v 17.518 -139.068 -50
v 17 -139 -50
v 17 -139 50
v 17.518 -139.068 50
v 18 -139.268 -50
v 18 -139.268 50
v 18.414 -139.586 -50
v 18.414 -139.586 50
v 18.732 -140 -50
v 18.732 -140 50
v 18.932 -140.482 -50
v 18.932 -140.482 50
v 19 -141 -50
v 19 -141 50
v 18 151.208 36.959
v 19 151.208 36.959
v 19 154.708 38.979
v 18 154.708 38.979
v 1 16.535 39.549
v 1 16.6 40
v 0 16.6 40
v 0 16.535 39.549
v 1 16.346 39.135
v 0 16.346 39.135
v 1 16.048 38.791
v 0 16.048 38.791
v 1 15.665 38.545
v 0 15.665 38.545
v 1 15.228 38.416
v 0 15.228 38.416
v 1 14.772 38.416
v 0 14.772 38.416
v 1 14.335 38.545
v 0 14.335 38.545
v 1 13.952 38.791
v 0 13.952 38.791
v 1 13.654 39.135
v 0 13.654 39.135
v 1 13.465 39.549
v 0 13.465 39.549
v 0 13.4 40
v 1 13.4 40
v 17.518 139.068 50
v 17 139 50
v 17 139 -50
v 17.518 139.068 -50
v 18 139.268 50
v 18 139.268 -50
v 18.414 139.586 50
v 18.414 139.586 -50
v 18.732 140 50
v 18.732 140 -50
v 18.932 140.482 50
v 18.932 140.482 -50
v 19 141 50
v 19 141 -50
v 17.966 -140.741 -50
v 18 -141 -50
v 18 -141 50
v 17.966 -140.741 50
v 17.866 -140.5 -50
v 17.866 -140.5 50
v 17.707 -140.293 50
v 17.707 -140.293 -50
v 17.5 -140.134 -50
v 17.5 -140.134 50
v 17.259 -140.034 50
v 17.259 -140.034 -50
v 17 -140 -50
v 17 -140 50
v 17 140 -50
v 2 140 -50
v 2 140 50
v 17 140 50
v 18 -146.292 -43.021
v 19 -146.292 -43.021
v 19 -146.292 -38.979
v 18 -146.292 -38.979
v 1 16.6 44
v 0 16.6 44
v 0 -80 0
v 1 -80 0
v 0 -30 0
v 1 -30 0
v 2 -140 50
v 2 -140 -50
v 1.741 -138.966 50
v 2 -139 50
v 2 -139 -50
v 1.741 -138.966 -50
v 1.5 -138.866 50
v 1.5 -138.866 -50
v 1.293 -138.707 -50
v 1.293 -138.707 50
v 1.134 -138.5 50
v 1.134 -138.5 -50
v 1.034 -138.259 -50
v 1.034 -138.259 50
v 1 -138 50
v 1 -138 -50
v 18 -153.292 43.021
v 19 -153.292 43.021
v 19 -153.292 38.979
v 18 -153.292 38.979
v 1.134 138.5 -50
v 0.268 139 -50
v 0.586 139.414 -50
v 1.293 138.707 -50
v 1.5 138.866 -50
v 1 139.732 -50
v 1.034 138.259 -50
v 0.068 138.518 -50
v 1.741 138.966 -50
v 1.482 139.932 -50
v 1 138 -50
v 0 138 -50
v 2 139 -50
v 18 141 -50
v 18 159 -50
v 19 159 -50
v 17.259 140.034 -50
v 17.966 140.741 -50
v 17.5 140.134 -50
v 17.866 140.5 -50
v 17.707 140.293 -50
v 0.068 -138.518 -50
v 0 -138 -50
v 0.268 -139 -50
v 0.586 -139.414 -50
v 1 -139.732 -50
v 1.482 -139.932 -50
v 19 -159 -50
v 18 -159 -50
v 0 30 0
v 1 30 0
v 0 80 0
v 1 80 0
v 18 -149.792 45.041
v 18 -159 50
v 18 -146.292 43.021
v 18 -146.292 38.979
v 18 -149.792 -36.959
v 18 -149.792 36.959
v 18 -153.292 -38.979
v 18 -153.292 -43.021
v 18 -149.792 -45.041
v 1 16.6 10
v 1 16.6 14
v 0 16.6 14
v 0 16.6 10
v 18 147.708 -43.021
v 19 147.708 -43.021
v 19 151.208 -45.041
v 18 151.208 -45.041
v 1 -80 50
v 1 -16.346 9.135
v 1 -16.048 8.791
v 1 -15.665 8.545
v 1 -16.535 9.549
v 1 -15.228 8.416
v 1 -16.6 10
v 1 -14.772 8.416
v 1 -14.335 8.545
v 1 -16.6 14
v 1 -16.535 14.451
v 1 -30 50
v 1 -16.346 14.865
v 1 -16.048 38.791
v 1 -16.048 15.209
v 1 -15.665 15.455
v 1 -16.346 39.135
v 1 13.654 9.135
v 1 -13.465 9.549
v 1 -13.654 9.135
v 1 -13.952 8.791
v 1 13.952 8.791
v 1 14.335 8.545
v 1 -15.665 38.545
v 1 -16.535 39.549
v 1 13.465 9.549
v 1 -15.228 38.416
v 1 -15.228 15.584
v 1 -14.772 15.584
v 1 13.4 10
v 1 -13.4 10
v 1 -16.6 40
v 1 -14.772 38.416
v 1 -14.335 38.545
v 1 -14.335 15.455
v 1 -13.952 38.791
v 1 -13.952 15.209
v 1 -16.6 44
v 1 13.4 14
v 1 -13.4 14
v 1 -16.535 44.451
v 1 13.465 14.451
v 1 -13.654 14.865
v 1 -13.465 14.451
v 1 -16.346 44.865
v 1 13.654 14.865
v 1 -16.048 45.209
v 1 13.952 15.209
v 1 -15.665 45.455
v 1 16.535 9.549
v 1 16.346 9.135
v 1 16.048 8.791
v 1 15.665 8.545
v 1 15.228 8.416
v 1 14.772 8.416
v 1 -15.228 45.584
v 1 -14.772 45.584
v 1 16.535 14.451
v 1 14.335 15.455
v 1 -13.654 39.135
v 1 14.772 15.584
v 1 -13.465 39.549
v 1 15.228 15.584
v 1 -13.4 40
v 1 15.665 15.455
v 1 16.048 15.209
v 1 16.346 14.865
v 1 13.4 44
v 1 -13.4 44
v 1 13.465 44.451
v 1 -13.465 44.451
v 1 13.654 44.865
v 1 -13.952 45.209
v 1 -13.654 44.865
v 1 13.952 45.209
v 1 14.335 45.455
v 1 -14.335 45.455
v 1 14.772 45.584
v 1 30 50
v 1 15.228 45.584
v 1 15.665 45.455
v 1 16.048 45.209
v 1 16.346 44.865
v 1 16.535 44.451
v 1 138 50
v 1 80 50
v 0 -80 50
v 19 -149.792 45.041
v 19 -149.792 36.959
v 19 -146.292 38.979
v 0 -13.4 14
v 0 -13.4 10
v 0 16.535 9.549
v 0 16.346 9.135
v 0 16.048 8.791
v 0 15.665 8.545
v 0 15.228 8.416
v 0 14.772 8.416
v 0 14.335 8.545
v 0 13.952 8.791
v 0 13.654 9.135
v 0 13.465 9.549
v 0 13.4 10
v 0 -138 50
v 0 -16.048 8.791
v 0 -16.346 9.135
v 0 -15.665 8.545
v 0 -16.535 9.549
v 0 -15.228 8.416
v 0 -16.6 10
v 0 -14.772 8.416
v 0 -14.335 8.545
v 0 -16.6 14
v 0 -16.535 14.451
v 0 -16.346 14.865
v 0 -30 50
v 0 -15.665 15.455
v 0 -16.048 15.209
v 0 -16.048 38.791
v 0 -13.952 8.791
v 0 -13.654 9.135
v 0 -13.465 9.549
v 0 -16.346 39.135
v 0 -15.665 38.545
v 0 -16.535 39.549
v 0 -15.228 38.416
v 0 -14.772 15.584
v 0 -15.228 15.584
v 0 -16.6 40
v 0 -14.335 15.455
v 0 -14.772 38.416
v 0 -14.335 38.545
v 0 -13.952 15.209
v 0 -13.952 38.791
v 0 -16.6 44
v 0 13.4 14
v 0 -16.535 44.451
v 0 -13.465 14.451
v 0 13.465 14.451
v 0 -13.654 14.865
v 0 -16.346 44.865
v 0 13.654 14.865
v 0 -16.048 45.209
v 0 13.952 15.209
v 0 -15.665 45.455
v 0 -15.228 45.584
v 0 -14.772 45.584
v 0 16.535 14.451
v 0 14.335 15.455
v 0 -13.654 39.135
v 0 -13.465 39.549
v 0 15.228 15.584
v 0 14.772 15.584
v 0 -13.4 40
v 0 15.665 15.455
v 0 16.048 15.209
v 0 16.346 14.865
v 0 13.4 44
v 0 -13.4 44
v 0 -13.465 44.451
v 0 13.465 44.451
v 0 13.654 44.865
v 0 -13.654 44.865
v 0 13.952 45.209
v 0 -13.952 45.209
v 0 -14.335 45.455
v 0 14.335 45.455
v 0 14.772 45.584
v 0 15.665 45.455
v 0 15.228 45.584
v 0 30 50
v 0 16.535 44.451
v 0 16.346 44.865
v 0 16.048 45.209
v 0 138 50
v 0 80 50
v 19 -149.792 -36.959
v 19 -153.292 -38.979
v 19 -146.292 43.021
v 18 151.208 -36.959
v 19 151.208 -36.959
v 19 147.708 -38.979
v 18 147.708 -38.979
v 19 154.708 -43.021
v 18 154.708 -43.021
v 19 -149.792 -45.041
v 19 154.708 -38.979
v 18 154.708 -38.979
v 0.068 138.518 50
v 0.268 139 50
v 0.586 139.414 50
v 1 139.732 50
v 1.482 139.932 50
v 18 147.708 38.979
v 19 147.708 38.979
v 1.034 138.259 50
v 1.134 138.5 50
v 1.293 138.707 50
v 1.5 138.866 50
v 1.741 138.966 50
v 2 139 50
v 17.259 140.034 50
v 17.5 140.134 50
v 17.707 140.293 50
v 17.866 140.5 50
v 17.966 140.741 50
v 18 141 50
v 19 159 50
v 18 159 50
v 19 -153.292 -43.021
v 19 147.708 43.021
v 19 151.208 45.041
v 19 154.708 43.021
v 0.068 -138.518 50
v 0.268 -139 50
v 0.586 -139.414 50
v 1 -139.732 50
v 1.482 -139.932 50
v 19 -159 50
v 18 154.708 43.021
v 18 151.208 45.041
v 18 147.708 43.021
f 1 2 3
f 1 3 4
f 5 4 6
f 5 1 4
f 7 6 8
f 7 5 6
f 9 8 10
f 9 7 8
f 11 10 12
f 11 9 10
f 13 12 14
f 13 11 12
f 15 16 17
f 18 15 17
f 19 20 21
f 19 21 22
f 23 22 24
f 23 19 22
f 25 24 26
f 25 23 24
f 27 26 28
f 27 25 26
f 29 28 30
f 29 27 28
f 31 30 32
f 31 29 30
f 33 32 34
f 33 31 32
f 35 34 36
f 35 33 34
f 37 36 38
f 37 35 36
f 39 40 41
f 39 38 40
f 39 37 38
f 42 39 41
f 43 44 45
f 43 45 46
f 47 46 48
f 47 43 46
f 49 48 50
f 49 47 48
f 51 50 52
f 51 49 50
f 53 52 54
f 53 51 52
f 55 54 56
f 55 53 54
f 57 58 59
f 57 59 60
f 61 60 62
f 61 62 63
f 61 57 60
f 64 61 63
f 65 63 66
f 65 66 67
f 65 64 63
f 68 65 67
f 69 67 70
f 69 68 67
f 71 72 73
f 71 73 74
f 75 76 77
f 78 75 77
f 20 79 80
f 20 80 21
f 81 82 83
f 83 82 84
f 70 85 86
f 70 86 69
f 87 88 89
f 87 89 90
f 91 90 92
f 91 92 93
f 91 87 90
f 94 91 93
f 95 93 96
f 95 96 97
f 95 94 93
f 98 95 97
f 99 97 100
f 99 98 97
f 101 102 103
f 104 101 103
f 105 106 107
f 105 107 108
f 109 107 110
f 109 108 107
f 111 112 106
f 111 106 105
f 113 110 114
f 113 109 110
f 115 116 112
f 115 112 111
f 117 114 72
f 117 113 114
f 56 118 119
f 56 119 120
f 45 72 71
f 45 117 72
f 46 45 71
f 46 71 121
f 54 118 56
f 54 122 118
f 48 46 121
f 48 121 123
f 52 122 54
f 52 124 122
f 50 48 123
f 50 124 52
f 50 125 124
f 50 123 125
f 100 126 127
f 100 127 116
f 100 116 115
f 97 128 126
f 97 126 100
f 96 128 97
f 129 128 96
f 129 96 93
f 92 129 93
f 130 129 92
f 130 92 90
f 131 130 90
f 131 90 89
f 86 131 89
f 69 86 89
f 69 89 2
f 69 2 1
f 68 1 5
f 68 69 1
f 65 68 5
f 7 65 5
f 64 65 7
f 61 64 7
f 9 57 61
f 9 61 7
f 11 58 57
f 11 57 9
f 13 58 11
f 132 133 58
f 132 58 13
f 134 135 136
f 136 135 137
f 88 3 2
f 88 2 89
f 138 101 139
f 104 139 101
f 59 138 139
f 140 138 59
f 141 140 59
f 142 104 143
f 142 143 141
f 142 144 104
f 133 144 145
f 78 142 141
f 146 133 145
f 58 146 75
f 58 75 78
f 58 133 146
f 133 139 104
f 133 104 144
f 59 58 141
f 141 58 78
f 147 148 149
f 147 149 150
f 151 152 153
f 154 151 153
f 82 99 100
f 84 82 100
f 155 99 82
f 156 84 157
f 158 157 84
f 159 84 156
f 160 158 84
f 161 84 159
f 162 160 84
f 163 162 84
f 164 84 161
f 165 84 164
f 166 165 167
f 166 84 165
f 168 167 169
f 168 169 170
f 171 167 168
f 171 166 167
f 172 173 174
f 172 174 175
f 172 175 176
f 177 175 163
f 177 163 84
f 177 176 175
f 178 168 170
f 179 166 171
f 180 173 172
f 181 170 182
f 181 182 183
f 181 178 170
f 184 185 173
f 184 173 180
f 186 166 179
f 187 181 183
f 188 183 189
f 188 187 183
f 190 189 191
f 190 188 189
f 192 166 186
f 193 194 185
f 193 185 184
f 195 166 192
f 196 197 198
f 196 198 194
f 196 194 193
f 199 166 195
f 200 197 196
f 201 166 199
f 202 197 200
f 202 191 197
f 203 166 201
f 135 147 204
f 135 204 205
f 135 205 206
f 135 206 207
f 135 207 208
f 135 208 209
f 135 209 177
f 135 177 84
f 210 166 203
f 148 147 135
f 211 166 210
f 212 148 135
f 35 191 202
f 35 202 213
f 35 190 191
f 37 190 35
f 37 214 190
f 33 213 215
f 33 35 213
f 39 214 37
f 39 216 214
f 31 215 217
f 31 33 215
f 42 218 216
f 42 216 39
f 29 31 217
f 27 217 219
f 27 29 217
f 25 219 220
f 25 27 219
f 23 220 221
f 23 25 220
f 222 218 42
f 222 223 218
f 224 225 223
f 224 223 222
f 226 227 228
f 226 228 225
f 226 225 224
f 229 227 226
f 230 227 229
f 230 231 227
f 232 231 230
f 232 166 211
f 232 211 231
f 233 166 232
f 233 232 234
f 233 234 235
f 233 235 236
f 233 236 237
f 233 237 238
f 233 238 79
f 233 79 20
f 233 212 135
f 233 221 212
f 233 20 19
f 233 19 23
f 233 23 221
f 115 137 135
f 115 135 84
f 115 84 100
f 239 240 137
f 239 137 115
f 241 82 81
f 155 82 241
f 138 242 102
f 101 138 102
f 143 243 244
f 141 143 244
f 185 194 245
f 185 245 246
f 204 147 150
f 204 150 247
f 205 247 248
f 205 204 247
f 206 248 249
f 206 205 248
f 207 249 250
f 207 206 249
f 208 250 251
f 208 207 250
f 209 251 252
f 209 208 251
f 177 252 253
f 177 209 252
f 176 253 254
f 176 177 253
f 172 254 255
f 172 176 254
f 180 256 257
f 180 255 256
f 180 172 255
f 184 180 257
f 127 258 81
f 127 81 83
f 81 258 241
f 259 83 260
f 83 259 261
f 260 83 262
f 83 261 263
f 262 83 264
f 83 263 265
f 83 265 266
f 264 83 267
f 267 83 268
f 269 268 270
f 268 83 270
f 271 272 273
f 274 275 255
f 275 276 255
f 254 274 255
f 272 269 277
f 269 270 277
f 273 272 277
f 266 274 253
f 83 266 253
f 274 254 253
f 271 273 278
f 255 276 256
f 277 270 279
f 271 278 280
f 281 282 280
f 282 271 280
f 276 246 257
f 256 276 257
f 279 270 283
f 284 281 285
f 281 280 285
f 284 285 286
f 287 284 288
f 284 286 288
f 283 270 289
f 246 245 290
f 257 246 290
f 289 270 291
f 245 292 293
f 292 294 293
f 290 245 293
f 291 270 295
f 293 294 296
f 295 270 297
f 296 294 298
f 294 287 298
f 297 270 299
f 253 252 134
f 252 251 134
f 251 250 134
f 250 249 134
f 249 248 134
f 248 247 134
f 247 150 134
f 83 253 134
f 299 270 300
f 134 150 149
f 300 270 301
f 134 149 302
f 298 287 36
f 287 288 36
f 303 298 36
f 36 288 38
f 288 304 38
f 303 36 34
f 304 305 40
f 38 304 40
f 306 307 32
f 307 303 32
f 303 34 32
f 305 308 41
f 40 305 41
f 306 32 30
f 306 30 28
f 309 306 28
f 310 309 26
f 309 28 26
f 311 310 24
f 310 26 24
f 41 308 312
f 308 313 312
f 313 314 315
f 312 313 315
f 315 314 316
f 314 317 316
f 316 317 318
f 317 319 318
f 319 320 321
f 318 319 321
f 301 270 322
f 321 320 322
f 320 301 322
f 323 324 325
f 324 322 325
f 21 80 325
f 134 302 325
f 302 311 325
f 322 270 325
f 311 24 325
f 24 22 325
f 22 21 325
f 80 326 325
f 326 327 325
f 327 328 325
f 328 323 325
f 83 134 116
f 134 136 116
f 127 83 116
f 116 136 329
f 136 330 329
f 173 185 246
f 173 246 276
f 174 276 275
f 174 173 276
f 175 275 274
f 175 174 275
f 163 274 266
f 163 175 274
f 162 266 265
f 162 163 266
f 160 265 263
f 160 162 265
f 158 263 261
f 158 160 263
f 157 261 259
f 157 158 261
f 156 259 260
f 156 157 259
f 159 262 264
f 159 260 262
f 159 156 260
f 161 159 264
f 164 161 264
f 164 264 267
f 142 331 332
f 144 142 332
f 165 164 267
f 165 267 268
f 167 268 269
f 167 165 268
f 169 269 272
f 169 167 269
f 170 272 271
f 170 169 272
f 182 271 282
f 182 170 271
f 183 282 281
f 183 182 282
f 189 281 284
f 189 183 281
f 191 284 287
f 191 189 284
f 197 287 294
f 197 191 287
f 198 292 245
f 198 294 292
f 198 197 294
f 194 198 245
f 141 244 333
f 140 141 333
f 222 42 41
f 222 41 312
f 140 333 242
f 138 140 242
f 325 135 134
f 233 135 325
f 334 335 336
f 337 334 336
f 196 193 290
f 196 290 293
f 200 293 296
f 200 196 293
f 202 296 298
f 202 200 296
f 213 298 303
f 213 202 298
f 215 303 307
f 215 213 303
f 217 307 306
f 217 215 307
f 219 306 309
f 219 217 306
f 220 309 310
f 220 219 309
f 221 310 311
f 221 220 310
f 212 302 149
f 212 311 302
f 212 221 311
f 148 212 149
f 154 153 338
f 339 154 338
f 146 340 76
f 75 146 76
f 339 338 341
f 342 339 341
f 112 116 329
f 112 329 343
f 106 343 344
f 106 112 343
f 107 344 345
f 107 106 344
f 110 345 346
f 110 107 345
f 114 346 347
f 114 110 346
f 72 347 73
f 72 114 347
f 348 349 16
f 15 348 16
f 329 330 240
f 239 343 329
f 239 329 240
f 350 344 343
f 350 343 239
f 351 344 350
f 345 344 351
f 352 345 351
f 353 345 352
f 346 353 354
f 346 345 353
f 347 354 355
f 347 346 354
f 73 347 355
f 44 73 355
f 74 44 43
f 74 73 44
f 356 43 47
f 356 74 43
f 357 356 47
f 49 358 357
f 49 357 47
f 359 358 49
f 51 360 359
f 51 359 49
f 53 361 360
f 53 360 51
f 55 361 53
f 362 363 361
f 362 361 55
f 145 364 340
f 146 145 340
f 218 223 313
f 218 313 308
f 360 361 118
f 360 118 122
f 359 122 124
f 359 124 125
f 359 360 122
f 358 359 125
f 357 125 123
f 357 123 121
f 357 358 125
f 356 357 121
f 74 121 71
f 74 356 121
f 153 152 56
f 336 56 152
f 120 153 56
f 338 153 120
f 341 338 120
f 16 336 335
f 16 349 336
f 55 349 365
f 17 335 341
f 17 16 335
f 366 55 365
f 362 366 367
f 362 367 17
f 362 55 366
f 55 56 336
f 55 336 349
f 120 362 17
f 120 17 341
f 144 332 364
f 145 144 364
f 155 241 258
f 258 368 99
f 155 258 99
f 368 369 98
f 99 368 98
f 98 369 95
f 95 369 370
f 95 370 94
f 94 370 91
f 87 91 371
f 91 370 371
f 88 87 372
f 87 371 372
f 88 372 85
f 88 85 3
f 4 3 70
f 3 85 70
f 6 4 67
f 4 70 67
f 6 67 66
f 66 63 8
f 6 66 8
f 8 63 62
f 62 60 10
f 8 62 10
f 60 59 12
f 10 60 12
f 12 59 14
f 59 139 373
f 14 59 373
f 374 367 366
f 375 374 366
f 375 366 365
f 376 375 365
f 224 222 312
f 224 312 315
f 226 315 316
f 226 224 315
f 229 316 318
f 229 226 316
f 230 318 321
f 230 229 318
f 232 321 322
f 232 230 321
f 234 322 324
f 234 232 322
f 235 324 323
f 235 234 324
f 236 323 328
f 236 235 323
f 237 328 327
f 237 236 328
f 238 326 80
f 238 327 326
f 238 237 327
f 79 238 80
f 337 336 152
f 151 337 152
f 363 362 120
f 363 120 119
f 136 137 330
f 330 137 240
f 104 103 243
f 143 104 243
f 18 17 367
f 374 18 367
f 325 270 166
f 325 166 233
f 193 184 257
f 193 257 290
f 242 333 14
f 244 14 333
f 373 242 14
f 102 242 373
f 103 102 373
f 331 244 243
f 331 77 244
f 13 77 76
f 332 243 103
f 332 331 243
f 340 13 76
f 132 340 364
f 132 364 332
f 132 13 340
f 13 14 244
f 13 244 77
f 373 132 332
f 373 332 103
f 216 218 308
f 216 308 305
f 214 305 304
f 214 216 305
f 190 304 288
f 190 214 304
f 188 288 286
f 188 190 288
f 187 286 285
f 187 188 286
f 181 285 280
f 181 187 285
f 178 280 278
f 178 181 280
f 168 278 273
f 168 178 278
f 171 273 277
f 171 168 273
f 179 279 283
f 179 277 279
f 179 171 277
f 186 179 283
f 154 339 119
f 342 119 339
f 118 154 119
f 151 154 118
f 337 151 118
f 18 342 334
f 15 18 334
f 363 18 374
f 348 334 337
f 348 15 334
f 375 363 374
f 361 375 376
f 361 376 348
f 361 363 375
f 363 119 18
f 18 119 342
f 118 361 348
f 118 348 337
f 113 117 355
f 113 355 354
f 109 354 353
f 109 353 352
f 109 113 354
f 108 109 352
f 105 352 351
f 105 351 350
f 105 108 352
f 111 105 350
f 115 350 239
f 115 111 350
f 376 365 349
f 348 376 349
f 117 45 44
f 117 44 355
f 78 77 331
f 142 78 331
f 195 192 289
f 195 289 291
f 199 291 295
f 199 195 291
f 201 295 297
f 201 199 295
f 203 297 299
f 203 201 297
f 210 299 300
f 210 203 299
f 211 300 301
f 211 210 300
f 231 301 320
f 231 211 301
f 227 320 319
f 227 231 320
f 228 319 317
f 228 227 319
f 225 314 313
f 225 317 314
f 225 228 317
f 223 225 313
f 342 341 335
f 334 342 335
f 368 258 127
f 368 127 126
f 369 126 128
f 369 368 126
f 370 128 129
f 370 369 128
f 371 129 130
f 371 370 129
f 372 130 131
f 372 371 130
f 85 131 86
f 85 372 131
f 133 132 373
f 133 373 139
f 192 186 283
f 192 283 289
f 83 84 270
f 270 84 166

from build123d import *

# Parameters (mm, degrees)
SKETCH1_W                      = 280
SKETCH1_H                      = 100
BOSS_EXTRUDE1_DEPTH            = 1
SKETCH2_W                      = 50
SKETCH2_H                      = 50
CUT_EXTRUDE3_DEPTH             = 149.664050799
CUT_EXTRUDE4_DEPTH             = 149.664050799
EDGE_FLANGE1_STRIP_W           = 6
EDGE_FLANGE1_STRIP_H           = 1
EDGE_FLANGE1_STRIP_CUT_DEPTH   = 100
EDGE_FLANGE1_STRIP_2_W         = 6
EDGE_FLANGE1_STRIP_2_H         = 1
EDGE_FLANGE1_STRIP_CUT_2_DEPTH = 100
EDGE_FLANGE1_DEPTH             = 100
EDGE_FLANGE1_BEND_DEPTH        = 100
EDGE_FLANGE2_STRIP_W           = 6
EDGE_FLANGE2_STRIP_H           = 1
EDGE_FLANGE2_STRIP_CUT_DEPTH   = 100
EDGE_FLANGE2_STRIP_2_W         = 6
EDGE_FLANGE2_STRIP_2_H         = 1
EDGE_FLANGE2_STRIP_CUT_2_DEPTH = 100
EDGE_FLANGE2_DEPTH             = 100
EDGE_FLANGE2_BEND_DEPTH        = 100
CUT_EXTRUDE5_DEPTH             = 168.755774863


# Sheet-metal steps are written as plain solids
with BuildPart() as part:
    # Sketch1 → Boss-Extrude1 (new body)
    with BuildSketch(Plane.YZ):
        Rectangle(SKETCH1_W, SKETCH1_H)
    extrude(amount=BOSS_EXTRUDE1_DEPTH)

    # Sketch2 → Cut-Extrude3 (cut, through all)
    with BuildSketch(Plane.YZ.offset(1)):
        with Locations((-55, 25)):
            Rectangle(SKETCH2_W, SKETCH2_H)
        with Locations((55, 25)):
            Rectangle(SKETCH2_W, SKETCH2_H)
    extrude(amount=-CUT_EXTRUDE3_DEPTH, mode=Mode.SUBTRACT)

    # Sketch3 → Cut-Extrude4 (cut, through all)
    with BuildSketch(Plane.YZ.offset(1)):
        with BuildLine():
            Line((-16.6, 40), (-16.6, 44))
            ThreePointArc((-16.6, 44), (-15, 45.6), (-13.4, 44))
            Line((-13.4, 44), (-13.4, 40))
            ThreePointArc((-13.4, 40), (-15, 38.4), (-16.6, 40))
        make_face()
        with BuildLine():
            Line((13.4, 40), (13.4, 44))
            ThreePointArc((13.4, 44), (15, 45.6), (16.6, 44))
            Line((16.6, 44), (16.6, 40))
            ThreePointArc((16.6, 40), (15, 38.4), (13.4, 40))
        make_face()
        with BuildLine():
            Line((13.4, 10), (13.4, 14))
            ThreePointArc((13.4, 14), (15, 15.6), (16.6, 14))
            Line((16.6, 14), (16.6, 10))
            ThreePointArc((16.6, 10), (15, 8.4), (13.4, 10))
        make_face()
        with BuildLine():
            Line((-16.6, 10), (-16.6, 14))
            ThreePointArc((-16.6, 14), (-15, 15.6), (-13.4, 14))
            Line((-13.4, 14), (-13.4, 10))
            ThreePointArc((-13.4, 10), (-15, 8.4), (-16.6, 10))
        make_face()
    extrude(amount=-CUT_EXTRUDE4_DEPTH, mode=Mode.SUBTRACT)

    # Edge-Flange1 strip (across the edge) → Edge-Flange1 strip cut (cut)
    with BuildSketch(Plane(origin=(1, 140, -50), x_dir=(0, -1, 0), z_dir=(0, 0, 1))):
        with Locations((-1, -0.5)):
            Rectangle(EDGE_FLANGE1_STRIP_W, EDGE_FLANGE1_STRIP_H)
    extrude(amount=EDGE_FLANGE1_STRIP_CUT_DEPTH, mode=Mode.SUBTRACT)

    # Edge-Flange1 strip 2 (across the edge) → Edge-Flange1 strip cut 2 (cut)
    with BuildSketch(Plane(origin=(1, -140, 50), x_dir=(0, 1, 0), z_dir=(0, 0, -1))):
        with Locations((-1, -0.5)):
            Rectangle(EDGE_FLANGE1_STRIP_2_W, EDGE_FLANGE1_STRIP_2_H)
    extrude(amount=EDGE_FLANGE1_STRIP_CUT_2_DEPTH, mode=Mode.SUBTRACT)

    # Edge-Flange1 section (across the edge) → Edge-Flange1 (add)
    with BuildSketch(Plane(origin=(1, 140, -50), x_dir=(0, -1, 0), z_dir=(0, 0, 1))):
        with BuildLine():
            Line((0, 1), (0, 18))
            Line((0, 18), (1, 18))
            Line((1, 18), (1, 1))
            ThreePointArc((1, 1), (1.292893219, 0.292893219), (2, 0))
            Line((2, 0), (2, -1))
            ThreePointArc((2, -1), (0.585786438, -0.414213562), (0, 1))
        make_face()
    extrude(amount=EDGE_FLANGE1_DEPTH)

    # Edge-Flange1 section 2 (across the edge) → Edge-Flange1 bend (add)
    with BuildSketch(Plane(origin=(1, -140, 50), x_dir=(0, 1, 0), z_dir=(0, 0, -1))):
        with BuildLine():
            Line((0, 1), (0, 18))
            Line((0, 18), (1, 18))
            Line((1, 18), (1, 1))
            ThreePointArc((1, 1), (1.292893219, 0.292893219), (2, 0))
            Line((2, 0), (2, -1))
            ThreePointArc((2, -1), (0.585786438, -0.414213562), (0, 1))
        make_face()
    extrude(amount=EDGE_FLANGE1_BEND_DEPTH)

    # Edge-Flange2 strip (across the edge) → Edge-Flange2 strip cut (cut)
    with BuildSketch(Plane(origin=(19, 140, 50), x_dir=(-1, 0, 0), z_dir=(0, 0, -1))):
        with Locations((-1, -0.5)):
            Rectangle(EDGE_FLANGE2_STRIP_W, EDGE_FLANGE2_STRIP_H)
    extrude(amount=EDGE_FLANGE2_STRIP_CUT_DEPTH, mode=Mode.SUBTRACT)

    # Edge-Flange2 strip 2 (across the edge) → Edge-Flange2 strip cut 2 (cut)
    with BuildSketch(Plane(origin=(19, -140, -50), x_dir=(-1, 0, 0), z_dir=(0, 0, 1))):
        with Locations((-1, -0.5)):
            Rectangle(EDGE_FLANGE2_STRIP_2_W, EDGE_FLANGE2_STRIP_2_H)
    extrude(amount=EDGE_FLANGE2_STRIP_CUT_2_DEPTH, mode=Mode.SUBTRACT)

    # Edge-Flange2 section (across the edge) → Edge-Flange2 (add)
    with BuildSketch(Plane(origin=(19, 140, 50), x_dir=(-1, 0, 0), z_dir=(0, 0, -1))):
        with BuildLine():
            Line((0, 1), (0, 19))
            Line((0, 19), (1, 19))
            Line((1, 19), (1, 1))
            ThreePointArc((1, 1), (1.292893219, 0.292893219), (2, 0))
            Line((2, 0), (2, -1))
            ThreePointArc((2, -1), (0.585786438, -0.414213562), (0, 1))
        make_face()
    extrude(amount=EDGE_FLANGE2_DEPTH)

    # Edge-Flange2 section 2 (across the edge) → Edge-Flange2 bend (add)
    with BuildSketch(Plane(origin=(19, -140, -50), x_dir=(-1, 0, 0), z_dir=(0, 0, 1))):
        with BuildLine():
            Line((0, 1), (0, 19))
            Line((0, 19), (1, 19))
            Line((1, 19), (1, 1))
            ThreePointArc((1, 1), (1.292893219, 0.292893219), (2, 0))
            Line((2, 0), (2, -1))
            ThreePointArc((2, -1), (0.585786438, -0.414213562), (0, 1))
        make_face()
    extrude(amount=EDGE_FLANGE2_BEND_DEPTH)

    # Sketch26 → Cut-Extrude5 (cut, through all)
    with BuildSketch(Plane.YZ.offset(19)):
        Polygon((-149.792397295, 45.041451884), (-153.292397295, 43.020725942), (-153.292397295, 38.979274058), (-149.792397295, 36.958548116), (-146.292397295, 38.979274058), (-146.292397295, 43.020725942), align=None)
        Polygon((-149.792397295, -36.958548116), (-153.292397295, -38.979274058), (-153.292397295, -43.020725942), (-149.792397295, -45.041451884), (-146.292397295, -43.020725942), (-146.292397295, -38.979274058), align=None)
        Polygon((147.707602705, -43.020725942), (151.207602705, -45.041451884), (154.707602705, -43.020725942), (154.707602705, -38.979274058), (151.207602705, -36.958548116), (147.707602705, -38.979274058), align=None)
        Polygon((147.707602705, 38.979274058), (151.207602705, 36.958548116), (154.707602705, 38.979274058), (154.707602705, 43.020725942), (151.207602705, 45.041451884), (147.707602705, 43.020725942), align=None)
    extrude(amount=-CUT_EXTRUDE5_DEPTH, mode=Mode.SUBTRACT)


solid = part.part
